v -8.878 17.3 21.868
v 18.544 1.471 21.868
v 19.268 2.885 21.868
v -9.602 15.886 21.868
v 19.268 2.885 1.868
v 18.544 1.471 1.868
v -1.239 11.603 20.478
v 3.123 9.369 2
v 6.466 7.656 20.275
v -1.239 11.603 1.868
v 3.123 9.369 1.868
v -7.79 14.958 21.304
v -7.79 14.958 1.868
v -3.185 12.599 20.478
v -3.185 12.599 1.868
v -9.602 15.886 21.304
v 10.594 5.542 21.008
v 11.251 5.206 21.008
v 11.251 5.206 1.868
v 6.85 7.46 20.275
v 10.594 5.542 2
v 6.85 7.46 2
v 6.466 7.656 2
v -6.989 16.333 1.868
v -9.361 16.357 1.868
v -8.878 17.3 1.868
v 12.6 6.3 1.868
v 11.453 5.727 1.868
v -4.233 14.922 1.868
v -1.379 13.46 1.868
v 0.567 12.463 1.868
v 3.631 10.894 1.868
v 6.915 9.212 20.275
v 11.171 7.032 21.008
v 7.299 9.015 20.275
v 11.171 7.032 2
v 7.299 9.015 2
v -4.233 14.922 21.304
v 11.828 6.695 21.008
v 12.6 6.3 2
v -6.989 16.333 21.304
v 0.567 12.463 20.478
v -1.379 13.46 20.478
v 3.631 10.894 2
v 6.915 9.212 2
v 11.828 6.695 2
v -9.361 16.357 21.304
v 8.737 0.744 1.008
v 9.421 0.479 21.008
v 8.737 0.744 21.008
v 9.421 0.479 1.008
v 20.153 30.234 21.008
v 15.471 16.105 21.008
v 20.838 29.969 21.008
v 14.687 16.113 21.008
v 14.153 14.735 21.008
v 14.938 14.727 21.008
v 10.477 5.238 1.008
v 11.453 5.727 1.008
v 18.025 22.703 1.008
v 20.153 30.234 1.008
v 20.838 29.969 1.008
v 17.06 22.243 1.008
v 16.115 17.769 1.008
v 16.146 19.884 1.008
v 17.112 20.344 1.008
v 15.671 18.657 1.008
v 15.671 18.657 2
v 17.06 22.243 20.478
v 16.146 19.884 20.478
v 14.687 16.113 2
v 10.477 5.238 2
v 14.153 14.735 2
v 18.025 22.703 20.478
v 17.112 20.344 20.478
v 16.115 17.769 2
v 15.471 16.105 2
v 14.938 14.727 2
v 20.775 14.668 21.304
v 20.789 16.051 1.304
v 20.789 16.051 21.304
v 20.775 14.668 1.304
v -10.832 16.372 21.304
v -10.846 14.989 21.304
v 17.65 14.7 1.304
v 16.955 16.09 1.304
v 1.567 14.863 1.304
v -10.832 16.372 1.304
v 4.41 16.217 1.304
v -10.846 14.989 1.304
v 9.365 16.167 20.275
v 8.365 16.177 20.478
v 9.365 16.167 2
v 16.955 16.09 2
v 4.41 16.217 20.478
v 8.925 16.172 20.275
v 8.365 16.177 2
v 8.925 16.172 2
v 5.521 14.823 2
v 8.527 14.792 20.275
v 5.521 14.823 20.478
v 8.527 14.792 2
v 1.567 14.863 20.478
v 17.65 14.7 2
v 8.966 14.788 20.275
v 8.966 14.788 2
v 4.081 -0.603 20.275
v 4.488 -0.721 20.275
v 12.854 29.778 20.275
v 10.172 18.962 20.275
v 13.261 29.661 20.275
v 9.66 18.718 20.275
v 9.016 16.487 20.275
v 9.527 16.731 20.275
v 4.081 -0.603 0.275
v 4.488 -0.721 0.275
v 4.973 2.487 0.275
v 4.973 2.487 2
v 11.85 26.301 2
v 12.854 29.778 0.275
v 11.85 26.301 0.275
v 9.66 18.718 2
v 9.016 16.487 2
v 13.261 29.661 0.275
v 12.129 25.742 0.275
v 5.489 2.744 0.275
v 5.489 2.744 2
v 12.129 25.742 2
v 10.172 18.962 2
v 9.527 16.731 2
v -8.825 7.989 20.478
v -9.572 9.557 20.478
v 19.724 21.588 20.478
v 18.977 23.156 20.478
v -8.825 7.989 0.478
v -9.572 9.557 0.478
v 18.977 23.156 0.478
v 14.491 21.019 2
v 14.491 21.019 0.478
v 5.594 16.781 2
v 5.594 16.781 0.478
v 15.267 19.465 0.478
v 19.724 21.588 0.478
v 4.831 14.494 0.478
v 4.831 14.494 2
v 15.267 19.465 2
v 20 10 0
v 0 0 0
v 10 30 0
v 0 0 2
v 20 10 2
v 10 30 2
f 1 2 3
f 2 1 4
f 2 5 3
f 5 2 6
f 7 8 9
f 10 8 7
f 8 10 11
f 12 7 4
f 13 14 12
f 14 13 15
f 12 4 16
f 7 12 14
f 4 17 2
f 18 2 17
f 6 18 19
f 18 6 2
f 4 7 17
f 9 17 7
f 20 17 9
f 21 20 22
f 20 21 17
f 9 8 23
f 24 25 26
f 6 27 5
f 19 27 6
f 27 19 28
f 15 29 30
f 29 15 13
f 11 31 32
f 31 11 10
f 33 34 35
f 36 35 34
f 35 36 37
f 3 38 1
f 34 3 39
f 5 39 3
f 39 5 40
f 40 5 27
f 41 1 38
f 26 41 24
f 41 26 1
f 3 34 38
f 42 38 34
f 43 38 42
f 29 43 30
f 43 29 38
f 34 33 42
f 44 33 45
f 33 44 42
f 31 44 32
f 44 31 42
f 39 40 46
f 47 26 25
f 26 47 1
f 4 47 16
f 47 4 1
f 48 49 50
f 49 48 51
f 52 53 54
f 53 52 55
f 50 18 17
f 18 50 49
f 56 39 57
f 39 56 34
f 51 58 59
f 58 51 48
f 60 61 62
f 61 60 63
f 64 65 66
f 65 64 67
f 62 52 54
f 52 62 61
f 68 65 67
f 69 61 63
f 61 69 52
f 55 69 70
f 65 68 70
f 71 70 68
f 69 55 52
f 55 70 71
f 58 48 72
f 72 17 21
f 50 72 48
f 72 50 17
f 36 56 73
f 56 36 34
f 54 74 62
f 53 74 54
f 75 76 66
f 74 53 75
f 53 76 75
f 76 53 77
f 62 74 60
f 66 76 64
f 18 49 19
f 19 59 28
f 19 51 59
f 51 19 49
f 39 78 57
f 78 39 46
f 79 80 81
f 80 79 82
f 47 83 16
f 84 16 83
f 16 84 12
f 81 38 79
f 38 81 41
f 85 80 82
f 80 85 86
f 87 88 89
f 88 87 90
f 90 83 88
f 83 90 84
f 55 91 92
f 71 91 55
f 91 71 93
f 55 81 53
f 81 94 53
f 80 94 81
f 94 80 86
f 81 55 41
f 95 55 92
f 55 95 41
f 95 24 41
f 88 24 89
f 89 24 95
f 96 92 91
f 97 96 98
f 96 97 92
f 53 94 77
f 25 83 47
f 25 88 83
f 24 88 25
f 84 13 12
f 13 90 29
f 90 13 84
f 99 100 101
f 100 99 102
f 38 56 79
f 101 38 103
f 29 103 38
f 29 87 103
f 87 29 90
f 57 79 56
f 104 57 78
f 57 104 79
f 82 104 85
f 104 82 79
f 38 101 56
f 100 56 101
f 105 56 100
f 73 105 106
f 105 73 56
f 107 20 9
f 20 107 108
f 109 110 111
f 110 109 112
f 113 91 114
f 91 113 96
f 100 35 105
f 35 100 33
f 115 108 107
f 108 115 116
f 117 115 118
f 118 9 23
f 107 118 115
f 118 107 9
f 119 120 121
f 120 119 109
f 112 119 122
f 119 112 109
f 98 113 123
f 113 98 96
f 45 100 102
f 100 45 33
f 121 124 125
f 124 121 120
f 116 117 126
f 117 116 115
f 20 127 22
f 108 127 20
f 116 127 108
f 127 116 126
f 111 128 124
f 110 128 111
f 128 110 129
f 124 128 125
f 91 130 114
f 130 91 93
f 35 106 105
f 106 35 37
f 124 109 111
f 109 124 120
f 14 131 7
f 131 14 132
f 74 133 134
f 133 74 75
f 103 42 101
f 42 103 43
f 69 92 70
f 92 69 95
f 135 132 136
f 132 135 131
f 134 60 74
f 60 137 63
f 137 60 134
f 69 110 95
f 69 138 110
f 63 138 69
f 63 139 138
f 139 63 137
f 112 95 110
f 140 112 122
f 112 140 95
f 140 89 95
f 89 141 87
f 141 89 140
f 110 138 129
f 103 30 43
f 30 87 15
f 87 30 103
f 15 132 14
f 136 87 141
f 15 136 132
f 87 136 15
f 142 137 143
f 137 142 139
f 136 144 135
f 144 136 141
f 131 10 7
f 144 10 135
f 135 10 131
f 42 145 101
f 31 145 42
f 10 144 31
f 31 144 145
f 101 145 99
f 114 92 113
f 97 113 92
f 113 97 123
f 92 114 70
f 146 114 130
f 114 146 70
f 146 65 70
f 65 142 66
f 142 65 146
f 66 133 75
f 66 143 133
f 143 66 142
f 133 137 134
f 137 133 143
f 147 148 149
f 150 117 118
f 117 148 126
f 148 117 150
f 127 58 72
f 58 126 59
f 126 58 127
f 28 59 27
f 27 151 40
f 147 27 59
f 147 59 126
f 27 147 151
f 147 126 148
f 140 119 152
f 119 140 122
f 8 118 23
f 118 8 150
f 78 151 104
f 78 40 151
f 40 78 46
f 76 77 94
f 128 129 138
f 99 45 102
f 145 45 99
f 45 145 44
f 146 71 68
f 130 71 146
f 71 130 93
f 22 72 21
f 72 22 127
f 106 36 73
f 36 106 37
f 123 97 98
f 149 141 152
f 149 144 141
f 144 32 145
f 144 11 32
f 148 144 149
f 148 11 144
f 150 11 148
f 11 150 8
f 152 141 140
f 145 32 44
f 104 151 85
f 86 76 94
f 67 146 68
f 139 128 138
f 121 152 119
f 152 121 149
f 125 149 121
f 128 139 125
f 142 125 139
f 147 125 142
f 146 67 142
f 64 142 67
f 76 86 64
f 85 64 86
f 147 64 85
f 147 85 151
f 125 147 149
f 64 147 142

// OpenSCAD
pa = [0,0,0];
pb  = [20, 10, 0];
p3 = [10, 30, 0];
seed = 12345;
layerheight = 0.2;
sector_max_scl_z = 10;  
n_randomlines = 5;
thickness = 2;
extrusionwidth = 0.42;

function triangle_max_sideleng(a,b,c) = 
    let(
        a = norm(pb - pa),
        b = norm(p3 - pb),
        c = norm(pa - p3)
    )
    max([a,b,c]);



function random_point_in_triangle(pa, pb, pc, seed) =
    let(
        r1 = rands(0, 1, 1, seed)[0],
        r2 = rands(0, 1, 1, seed+23)[0],
        u  = r1 + r2 > 1 ? 1 - r1 : r1,
        v  = r1 + r2 > 1 ? 1 - r2 : r2
    )
    pa + u*(pb - pa) + v*(pc - pa);


        union(){
            for(i = [0:n_randomlines-1]) 
                let(
                    max_sidelength = triangle_max_sideleng(pa, pb, p3),
                    trn_rand = random_point_in_triangle(pa, pb, p3 , seed+i), 
                    rotation = rands(0,360,1, seed+i+50)[0], 
                    random_z_offset = rands(layerheight, thickness,1, seed+i+100)[0], 
                    width = max_sidelength, 
                    height = rands(extrusionwidth , extrusionwidth*5, 1, seed+i+150)[0] // width of the 'line'
                    // get a random point in the area of the 
                ){
                    translate([trn_rand[0], trn_rand[1], random_z_offset])
                    rotate([0,0,rotation])
                    translate([-(width/2), 0, 0])
                    color([0.2, 0.5, 0.8, 0.4])
                    cube([
                        width, 
                        height, 
                        sector_max_scl_z*2
                    ]);
                }
        } 
//visualize the triangle 
points = [[pa[0], pa[1]], [pb[0], pb[1]], [p3[0], p3[1]]];
faces = [[0,1,2]];
linear_extrude(height = thickness)
    polygon(points = points, paths = faces);
